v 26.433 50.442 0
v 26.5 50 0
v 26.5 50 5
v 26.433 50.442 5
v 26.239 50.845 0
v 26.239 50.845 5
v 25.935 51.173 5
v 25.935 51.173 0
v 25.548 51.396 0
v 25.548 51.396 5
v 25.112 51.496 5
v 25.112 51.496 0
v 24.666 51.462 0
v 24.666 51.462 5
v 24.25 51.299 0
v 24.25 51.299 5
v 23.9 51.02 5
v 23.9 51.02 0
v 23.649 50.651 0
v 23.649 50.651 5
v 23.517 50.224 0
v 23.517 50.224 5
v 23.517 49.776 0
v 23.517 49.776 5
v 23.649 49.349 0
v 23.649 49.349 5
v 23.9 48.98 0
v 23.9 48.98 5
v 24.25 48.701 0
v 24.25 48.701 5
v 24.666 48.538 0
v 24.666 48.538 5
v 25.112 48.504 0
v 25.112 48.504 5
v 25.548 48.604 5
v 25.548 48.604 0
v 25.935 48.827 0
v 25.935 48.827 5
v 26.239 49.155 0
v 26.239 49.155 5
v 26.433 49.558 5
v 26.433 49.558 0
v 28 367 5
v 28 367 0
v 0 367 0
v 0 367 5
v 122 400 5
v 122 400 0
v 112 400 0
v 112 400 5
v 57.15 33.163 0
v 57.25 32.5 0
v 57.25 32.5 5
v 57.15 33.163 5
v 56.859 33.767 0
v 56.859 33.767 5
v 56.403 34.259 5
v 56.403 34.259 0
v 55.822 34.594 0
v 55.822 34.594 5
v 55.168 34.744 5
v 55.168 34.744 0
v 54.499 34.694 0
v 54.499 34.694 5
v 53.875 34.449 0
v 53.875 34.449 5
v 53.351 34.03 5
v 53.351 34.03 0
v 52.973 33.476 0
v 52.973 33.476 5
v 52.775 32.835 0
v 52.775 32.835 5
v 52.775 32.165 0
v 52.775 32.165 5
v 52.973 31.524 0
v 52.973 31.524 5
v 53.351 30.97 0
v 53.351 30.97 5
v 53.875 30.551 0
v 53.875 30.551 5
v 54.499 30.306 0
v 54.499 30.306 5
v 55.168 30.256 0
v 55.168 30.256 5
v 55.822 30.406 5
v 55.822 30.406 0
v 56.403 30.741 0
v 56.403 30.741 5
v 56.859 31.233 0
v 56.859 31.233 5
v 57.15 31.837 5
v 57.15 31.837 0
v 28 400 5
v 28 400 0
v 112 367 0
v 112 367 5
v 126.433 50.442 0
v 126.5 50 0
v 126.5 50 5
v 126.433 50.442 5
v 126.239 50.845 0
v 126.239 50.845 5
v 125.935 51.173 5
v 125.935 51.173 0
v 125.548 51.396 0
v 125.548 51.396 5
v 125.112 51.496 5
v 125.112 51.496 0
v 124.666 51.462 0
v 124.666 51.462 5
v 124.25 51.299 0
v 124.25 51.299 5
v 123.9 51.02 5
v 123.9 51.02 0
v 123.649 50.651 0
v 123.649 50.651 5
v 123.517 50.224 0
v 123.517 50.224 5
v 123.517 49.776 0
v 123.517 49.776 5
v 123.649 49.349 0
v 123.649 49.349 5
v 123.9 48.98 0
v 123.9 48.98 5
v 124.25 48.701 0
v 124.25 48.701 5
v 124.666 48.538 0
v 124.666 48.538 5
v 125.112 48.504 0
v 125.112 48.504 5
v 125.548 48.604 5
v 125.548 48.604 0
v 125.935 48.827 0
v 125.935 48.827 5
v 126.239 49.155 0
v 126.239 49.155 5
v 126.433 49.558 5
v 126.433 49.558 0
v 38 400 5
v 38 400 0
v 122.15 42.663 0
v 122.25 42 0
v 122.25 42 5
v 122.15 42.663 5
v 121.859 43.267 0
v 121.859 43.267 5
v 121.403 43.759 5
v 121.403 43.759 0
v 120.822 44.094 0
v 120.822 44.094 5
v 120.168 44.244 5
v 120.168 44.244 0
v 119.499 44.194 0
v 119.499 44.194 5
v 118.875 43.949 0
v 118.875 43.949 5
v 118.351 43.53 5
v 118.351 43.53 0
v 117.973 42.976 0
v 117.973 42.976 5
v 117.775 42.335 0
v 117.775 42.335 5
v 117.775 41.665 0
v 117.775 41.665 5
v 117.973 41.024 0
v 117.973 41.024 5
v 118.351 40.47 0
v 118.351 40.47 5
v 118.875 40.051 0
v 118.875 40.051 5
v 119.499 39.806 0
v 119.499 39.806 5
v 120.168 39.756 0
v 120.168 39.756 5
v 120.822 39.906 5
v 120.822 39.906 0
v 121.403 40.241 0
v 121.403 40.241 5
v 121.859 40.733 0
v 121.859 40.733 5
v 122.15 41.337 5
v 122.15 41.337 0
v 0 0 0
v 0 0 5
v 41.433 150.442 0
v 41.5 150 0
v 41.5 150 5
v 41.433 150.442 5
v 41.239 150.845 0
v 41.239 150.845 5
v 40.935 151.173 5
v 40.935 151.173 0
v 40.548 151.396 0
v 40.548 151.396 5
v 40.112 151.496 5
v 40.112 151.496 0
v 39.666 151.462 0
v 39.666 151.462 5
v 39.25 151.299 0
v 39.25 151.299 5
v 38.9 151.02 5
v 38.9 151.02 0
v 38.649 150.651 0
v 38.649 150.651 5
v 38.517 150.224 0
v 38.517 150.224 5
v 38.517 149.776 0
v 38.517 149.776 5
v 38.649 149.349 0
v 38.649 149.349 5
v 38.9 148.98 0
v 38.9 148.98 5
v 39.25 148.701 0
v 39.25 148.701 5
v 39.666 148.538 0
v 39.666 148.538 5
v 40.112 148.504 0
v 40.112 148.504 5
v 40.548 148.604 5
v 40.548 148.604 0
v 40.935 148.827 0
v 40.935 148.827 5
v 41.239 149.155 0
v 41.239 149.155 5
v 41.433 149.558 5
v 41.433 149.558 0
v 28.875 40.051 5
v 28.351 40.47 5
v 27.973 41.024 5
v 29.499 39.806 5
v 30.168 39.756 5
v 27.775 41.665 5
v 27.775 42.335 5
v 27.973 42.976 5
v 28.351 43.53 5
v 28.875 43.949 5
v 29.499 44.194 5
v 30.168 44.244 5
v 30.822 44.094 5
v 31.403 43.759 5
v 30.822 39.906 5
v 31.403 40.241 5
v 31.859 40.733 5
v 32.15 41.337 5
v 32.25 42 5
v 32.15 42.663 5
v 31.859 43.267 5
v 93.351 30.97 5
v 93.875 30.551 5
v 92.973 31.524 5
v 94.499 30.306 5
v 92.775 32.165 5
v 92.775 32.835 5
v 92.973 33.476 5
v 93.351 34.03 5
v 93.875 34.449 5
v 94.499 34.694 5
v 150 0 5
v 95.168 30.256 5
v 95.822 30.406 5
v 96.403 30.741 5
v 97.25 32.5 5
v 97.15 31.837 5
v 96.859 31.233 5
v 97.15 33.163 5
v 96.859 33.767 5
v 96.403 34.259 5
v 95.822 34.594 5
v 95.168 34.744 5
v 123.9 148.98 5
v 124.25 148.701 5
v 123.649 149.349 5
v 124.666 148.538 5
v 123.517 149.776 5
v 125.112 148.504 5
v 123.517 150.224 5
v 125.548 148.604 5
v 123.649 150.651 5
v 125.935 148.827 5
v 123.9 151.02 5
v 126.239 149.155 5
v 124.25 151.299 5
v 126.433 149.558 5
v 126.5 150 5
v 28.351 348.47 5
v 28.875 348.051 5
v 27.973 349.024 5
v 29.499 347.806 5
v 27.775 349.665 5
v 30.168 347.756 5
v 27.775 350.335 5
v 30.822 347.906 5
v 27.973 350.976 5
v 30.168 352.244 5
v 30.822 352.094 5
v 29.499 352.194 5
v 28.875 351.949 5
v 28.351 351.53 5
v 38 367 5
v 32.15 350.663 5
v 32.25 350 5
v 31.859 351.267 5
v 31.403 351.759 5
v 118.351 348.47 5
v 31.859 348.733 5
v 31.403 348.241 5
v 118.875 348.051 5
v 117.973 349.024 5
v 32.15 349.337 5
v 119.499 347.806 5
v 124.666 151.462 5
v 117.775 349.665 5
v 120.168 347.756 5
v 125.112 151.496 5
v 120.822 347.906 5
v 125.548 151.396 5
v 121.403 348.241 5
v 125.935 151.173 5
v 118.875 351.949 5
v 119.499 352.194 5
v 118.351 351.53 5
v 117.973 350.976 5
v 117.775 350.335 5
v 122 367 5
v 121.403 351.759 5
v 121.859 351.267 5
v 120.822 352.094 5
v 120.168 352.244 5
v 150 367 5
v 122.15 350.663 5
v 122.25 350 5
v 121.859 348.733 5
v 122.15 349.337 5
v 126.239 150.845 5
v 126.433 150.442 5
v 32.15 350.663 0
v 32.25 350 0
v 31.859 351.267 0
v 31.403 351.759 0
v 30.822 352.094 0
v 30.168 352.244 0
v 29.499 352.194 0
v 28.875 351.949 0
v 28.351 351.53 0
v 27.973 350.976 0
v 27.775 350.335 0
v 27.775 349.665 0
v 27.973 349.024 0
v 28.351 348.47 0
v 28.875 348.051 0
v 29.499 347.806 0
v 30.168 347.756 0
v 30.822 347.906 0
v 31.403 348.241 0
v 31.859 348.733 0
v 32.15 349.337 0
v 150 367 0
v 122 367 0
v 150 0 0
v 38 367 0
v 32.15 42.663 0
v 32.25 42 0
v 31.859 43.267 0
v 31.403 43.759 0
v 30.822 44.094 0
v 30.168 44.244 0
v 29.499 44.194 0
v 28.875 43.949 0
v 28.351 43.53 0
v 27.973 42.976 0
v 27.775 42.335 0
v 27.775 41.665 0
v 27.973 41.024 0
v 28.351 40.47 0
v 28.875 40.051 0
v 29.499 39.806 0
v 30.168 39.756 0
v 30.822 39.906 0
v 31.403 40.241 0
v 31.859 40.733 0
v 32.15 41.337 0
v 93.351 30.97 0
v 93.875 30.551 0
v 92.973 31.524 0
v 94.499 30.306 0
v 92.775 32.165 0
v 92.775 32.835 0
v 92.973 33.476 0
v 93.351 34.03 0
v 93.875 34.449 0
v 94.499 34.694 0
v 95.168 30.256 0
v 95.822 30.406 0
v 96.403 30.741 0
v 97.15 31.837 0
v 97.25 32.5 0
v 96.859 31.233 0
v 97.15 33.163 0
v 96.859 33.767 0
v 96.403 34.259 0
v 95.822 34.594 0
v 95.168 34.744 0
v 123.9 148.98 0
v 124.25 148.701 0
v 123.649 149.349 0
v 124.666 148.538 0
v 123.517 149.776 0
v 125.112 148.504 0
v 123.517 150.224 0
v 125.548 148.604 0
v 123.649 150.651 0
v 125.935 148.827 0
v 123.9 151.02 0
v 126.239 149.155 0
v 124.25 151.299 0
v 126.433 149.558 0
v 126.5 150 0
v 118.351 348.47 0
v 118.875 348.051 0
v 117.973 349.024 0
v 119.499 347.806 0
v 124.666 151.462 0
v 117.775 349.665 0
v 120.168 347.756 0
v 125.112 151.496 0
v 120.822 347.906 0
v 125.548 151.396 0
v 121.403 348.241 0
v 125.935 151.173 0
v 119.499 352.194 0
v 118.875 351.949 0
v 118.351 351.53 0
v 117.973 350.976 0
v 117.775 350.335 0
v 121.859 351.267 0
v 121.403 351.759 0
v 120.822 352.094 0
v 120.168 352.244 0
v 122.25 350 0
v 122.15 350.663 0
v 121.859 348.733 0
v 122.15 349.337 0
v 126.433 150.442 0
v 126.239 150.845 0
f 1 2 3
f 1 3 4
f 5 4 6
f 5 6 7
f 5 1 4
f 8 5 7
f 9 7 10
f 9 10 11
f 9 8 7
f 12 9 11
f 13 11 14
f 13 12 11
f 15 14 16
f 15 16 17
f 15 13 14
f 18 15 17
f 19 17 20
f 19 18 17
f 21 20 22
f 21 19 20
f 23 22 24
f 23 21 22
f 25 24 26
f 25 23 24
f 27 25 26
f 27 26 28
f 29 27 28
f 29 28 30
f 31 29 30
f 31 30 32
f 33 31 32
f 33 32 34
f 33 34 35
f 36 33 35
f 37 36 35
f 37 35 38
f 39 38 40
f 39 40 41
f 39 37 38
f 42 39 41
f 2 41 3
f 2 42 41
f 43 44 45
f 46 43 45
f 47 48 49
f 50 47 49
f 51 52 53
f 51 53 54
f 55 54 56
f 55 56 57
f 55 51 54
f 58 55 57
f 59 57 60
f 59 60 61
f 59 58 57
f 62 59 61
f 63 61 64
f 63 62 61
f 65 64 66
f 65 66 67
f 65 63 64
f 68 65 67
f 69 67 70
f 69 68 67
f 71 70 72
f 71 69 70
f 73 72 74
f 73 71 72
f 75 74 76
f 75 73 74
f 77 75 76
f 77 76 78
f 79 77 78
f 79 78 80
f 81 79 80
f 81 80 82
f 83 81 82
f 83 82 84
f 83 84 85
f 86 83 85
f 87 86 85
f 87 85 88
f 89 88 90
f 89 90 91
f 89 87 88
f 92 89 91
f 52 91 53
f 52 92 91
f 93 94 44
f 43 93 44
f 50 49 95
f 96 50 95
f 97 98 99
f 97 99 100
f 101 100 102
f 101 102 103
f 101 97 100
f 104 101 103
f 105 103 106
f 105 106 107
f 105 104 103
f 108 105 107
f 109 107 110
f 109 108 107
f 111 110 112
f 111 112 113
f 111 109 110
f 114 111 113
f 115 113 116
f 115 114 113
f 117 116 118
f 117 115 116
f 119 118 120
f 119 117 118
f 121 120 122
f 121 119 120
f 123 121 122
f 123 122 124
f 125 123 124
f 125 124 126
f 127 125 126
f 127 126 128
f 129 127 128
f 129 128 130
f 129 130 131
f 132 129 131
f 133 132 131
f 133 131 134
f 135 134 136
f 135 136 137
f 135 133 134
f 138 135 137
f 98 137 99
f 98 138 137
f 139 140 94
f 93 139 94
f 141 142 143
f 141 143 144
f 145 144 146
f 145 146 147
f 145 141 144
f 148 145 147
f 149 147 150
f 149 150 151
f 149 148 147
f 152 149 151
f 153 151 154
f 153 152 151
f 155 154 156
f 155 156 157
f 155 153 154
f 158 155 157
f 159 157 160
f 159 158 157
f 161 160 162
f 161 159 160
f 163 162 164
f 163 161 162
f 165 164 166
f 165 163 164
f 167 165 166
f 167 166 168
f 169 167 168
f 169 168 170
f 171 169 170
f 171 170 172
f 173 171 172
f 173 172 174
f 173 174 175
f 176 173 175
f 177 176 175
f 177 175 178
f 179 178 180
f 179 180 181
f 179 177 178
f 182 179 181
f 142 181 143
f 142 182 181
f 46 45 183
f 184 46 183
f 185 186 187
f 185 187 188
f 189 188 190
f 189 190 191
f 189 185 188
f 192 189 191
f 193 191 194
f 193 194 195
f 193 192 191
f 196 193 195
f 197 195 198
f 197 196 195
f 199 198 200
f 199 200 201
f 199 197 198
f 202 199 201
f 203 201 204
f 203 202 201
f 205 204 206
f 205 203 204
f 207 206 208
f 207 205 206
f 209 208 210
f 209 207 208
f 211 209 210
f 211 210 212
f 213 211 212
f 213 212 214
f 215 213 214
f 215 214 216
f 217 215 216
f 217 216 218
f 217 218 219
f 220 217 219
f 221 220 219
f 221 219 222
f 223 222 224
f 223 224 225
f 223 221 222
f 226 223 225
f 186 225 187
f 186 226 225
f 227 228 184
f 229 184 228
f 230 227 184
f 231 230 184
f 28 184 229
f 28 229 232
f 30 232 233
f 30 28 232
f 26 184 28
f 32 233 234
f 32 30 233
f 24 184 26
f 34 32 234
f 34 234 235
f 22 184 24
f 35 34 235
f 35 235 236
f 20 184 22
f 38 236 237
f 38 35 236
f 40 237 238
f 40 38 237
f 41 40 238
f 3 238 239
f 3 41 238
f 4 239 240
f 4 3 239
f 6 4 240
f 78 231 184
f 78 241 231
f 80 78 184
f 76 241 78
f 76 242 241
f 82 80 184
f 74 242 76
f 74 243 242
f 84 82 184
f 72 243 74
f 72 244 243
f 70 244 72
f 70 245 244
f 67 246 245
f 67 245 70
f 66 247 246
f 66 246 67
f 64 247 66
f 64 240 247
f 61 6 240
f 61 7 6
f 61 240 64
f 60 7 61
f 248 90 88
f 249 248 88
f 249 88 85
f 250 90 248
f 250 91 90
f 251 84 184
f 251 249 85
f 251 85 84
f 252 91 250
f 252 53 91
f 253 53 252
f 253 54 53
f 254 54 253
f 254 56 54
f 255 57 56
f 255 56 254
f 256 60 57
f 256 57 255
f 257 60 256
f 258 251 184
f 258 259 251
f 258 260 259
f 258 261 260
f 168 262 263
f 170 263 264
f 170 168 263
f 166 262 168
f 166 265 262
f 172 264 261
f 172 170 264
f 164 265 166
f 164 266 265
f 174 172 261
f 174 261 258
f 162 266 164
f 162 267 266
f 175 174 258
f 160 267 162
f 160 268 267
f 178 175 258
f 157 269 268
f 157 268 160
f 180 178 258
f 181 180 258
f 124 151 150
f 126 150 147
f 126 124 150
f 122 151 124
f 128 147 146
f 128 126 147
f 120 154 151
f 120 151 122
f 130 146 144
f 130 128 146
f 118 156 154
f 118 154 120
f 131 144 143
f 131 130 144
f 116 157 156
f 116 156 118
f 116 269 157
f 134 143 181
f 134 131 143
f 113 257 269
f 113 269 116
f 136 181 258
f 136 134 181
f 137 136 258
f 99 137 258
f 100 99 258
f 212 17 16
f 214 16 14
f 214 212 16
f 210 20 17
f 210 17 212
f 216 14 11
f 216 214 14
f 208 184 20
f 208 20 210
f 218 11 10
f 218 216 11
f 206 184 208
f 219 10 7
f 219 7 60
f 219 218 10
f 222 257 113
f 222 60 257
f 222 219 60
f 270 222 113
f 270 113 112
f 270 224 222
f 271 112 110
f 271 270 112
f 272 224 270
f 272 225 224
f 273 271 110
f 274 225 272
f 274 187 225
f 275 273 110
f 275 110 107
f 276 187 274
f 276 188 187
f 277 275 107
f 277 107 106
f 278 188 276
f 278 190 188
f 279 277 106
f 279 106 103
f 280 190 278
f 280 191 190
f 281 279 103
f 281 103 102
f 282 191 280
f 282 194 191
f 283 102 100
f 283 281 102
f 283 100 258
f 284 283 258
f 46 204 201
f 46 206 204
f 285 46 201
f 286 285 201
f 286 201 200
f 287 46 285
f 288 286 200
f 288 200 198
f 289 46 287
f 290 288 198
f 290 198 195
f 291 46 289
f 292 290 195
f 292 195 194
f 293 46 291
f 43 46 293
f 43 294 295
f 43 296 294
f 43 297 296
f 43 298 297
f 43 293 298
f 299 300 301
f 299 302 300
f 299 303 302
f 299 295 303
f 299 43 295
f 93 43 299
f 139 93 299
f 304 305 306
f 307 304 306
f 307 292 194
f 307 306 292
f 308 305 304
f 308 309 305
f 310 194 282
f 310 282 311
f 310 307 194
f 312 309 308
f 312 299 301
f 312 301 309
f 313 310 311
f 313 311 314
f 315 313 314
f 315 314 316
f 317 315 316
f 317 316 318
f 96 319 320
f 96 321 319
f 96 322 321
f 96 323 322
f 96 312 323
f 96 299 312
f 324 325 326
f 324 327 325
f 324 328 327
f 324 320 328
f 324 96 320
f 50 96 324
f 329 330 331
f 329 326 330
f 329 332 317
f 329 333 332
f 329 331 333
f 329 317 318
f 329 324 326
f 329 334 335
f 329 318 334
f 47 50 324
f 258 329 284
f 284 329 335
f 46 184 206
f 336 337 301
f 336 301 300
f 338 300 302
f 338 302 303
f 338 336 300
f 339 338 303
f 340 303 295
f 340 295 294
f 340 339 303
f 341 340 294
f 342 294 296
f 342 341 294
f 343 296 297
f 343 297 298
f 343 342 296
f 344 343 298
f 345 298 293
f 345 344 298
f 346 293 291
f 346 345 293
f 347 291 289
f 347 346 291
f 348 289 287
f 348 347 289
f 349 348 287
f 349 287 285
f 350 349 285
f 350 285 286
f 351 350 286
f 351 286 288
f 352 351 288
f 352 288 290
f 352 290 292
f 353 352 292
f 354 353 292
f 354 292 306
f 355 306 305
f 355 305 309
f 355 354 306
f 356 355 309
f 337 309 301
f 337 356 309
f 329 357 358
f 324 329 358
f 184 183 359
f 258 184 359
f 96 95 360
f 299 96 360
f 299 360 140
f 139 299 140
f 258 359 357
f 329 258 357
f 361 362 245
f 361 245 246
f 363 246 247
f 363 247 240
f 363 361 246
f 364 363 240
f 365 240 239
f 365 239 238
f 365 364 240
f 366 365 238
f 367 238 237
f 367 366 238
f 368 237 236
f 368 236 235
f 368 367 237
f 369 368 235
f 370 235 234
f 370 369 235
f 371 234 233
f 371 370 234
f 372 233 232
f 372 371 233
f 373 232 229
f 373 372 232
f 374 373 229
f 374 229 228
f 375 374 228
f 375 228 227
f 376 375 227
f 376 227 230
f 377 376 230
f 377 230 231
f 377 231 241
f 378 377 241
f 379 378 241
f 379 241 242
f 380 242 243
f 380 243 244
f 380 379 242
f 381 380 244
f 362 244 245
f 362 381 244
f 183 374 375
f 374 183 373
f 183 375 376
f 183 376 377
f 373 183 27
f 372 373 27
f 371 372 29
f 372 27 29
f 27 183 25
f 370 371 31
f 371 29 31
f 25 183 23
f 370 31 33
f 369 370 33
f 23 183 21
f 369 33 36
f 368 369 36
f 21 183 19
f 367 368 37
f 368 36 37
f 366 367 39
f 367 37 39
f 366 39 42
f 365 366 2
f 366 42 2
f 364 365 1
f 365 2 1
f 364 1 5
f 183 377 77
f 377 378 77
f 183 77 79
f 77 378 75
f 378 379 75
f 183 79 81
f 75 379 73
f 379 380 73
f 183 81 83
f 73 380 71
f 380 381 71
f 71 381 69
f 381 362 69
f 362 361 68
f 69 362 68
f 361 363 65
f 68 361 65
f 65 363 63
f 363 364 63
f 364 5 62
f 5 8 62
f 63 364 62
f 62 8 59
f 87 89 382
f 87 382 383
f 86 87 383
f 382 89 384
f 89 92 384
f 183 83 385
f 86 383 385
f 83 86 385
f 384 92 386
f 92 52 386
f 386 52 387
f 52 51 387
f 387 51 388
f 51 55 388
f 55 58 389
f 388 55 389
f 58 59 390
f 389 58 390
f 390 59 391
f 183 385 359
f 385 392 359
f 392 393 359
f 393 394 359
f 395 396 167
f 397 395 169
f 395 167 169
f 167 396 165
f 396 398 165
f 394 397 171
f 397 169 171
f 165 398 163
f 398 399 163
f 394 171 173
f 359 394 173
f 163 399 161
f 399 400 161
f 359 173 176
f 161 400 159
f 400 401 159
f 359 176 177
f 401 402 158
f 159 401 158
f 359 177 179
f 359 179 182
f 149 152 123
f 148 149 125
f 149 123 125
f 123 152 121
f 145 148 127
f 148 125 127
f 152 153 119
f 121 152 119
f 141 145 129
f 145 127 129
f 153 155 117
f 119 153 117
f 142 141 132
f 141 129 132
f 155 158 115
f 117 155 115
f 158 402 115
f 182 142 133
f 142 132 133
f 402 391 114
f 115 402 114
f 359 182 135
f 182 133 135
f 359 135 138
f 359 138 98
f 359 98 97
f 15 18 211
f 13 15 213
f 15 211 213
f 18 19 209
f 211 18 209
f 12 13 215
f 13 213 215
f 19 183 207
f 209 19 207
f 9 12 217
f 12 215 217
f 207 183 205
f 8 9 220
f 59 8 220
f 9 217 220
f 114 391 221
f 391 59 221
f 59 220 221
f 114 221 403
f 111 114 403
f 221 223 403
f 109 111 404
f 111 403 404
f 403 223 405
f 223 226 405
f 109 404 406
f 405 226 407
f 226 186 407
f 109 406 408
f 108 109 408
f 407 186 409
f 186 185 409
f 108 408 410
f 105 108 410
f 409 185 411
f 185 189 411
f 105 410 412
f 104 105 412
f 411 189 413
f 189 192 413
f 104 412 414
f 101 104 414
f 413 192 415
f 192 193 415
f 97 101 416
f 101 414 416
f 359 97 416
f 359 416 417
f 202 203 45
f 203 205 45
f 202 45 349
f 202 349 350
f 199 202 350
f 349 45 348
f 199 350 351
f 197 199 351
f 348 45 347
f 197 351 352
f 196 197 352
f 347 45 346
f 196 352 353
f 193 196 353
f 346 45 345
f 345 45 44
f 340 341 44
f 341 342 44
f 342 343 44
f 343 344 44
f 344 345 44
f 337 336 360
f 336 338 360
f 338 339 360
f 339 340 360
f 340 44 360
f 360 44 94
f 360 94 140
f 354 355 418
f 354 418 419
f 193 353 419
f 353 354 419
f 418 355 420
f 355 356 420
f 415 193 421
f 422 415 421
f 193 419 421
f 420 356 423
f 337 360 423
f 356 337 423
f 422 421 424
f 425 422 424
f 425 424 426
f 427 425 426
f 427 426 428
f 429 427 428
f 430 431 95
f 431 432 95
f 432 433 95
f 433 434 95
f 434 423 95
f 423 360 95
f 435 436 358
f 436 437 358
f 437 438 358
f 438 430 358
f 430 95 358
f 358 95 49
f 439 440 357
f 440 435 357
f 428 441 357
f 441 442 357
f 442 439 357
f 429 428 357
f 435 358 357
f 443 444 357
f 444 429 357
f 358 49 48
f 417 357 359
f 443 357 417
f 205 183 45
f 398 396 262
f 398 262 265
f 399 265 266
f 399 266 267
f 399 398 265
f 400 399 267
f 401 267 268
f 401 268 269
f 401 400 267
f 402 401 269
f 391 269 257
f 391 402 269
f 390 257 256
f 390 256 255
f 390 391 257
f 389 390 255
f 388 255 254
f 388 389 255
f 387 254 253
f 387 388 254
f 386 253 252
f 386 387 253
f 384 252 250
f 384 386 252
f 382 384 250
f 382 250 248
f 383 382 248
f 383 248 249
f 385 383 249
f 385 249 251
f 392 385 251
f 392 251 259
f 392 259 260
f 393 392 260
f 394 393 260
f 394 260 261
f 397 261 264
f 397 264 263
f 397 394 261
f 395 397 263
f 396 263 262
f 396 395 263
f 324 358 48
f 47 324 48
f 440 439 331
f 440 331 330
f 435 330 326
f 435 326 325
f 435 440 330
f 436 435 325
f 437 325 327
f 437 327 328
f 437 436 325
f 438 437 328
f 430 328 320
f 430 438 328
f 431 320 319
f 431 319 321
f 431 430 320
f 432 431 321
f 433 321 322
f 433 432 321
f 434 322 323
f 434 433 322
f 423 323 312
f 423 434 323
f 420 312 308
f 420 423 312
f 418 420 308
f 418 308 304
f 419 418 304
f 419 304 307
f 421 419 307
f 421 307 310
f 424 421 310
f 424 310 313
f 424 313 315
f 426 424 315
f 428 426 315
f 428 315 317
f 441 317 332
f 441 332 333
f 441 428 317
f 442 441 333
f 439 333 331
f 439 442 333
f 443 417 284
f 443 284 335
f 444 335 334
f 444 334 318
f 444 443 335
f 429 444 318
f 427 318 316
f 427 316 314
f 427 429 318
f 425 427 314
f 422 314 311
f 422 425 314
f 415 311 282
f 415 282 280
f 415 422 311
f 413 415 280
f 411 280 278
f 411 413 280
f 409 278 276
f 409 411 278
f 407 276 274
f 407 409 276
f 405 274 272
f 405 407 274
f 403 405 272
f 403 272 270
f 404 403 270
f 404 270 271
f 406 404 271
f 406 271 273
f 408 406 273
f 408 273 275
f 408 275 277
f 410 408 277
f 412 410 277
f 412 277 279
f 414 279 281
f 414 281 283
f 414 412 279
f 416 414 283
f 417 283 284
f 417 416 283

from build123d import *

# Parameters (mm, degrees)
SKETCH_1_R      = 2.25
SKETCH_1_R_2    = 1.5
EXTRUDE_1_DEPTH = 5


with BuildPart() as part:
    # 草图1 → 凸台-拉伸1 (new body)
    with BuildSketch(Plane.XY):
        Polygon((0, 0), (150, 0), (150, 367), (122, 367), (122, 400), (112, 400), (112, 367), (75, 367), (38, 367), (38, 400), (28, 400), (28, 367), (0, 367), align=None)
        with Locations((30, 42)):
            Circle(SKETCH_1_R, mode=Mode.SUBTRACT)
        with Locations((120, 42)):
            Circle(SKETCH_1_R, mode=Mode.SUBTRACT)
        with Locations((30, 350)):
            Circle(SKETCH_1_R, mode=Mode.SUBTRACT)
        with Locations((120, 350)):
            Circle(SKETCH_1_R, mode=Mode.SUBTRACT)
        with Locations((25, 50)):
            Circle(SKETCH_1_R_2, mode=Mode.SUBTRACT)
        with Locations((125, 50)):
            Circle(SKETCH_1_R_2, mode=Mode.SUBTRACT)
        with Locations((40, 150)):
            Circle(SKETCH_1_R_2, mode=Mode.SUBTRACT)
        with Locations((125, 150)):
            Circle(SKETCH_1_R_2, mode=Mode.SUBTRACT)
        with Locations((55, 32.5)):
            Circle(SKETCH_1_R, mode=Mode.SUBTRACT)
        with Locations((95, 32.5)):
            Circle(SKETCH_1_R, mode=Mode.SUBTRACT)
    extrude(amount=EXTRUDE_1_DEPTH)


solid = part.part
